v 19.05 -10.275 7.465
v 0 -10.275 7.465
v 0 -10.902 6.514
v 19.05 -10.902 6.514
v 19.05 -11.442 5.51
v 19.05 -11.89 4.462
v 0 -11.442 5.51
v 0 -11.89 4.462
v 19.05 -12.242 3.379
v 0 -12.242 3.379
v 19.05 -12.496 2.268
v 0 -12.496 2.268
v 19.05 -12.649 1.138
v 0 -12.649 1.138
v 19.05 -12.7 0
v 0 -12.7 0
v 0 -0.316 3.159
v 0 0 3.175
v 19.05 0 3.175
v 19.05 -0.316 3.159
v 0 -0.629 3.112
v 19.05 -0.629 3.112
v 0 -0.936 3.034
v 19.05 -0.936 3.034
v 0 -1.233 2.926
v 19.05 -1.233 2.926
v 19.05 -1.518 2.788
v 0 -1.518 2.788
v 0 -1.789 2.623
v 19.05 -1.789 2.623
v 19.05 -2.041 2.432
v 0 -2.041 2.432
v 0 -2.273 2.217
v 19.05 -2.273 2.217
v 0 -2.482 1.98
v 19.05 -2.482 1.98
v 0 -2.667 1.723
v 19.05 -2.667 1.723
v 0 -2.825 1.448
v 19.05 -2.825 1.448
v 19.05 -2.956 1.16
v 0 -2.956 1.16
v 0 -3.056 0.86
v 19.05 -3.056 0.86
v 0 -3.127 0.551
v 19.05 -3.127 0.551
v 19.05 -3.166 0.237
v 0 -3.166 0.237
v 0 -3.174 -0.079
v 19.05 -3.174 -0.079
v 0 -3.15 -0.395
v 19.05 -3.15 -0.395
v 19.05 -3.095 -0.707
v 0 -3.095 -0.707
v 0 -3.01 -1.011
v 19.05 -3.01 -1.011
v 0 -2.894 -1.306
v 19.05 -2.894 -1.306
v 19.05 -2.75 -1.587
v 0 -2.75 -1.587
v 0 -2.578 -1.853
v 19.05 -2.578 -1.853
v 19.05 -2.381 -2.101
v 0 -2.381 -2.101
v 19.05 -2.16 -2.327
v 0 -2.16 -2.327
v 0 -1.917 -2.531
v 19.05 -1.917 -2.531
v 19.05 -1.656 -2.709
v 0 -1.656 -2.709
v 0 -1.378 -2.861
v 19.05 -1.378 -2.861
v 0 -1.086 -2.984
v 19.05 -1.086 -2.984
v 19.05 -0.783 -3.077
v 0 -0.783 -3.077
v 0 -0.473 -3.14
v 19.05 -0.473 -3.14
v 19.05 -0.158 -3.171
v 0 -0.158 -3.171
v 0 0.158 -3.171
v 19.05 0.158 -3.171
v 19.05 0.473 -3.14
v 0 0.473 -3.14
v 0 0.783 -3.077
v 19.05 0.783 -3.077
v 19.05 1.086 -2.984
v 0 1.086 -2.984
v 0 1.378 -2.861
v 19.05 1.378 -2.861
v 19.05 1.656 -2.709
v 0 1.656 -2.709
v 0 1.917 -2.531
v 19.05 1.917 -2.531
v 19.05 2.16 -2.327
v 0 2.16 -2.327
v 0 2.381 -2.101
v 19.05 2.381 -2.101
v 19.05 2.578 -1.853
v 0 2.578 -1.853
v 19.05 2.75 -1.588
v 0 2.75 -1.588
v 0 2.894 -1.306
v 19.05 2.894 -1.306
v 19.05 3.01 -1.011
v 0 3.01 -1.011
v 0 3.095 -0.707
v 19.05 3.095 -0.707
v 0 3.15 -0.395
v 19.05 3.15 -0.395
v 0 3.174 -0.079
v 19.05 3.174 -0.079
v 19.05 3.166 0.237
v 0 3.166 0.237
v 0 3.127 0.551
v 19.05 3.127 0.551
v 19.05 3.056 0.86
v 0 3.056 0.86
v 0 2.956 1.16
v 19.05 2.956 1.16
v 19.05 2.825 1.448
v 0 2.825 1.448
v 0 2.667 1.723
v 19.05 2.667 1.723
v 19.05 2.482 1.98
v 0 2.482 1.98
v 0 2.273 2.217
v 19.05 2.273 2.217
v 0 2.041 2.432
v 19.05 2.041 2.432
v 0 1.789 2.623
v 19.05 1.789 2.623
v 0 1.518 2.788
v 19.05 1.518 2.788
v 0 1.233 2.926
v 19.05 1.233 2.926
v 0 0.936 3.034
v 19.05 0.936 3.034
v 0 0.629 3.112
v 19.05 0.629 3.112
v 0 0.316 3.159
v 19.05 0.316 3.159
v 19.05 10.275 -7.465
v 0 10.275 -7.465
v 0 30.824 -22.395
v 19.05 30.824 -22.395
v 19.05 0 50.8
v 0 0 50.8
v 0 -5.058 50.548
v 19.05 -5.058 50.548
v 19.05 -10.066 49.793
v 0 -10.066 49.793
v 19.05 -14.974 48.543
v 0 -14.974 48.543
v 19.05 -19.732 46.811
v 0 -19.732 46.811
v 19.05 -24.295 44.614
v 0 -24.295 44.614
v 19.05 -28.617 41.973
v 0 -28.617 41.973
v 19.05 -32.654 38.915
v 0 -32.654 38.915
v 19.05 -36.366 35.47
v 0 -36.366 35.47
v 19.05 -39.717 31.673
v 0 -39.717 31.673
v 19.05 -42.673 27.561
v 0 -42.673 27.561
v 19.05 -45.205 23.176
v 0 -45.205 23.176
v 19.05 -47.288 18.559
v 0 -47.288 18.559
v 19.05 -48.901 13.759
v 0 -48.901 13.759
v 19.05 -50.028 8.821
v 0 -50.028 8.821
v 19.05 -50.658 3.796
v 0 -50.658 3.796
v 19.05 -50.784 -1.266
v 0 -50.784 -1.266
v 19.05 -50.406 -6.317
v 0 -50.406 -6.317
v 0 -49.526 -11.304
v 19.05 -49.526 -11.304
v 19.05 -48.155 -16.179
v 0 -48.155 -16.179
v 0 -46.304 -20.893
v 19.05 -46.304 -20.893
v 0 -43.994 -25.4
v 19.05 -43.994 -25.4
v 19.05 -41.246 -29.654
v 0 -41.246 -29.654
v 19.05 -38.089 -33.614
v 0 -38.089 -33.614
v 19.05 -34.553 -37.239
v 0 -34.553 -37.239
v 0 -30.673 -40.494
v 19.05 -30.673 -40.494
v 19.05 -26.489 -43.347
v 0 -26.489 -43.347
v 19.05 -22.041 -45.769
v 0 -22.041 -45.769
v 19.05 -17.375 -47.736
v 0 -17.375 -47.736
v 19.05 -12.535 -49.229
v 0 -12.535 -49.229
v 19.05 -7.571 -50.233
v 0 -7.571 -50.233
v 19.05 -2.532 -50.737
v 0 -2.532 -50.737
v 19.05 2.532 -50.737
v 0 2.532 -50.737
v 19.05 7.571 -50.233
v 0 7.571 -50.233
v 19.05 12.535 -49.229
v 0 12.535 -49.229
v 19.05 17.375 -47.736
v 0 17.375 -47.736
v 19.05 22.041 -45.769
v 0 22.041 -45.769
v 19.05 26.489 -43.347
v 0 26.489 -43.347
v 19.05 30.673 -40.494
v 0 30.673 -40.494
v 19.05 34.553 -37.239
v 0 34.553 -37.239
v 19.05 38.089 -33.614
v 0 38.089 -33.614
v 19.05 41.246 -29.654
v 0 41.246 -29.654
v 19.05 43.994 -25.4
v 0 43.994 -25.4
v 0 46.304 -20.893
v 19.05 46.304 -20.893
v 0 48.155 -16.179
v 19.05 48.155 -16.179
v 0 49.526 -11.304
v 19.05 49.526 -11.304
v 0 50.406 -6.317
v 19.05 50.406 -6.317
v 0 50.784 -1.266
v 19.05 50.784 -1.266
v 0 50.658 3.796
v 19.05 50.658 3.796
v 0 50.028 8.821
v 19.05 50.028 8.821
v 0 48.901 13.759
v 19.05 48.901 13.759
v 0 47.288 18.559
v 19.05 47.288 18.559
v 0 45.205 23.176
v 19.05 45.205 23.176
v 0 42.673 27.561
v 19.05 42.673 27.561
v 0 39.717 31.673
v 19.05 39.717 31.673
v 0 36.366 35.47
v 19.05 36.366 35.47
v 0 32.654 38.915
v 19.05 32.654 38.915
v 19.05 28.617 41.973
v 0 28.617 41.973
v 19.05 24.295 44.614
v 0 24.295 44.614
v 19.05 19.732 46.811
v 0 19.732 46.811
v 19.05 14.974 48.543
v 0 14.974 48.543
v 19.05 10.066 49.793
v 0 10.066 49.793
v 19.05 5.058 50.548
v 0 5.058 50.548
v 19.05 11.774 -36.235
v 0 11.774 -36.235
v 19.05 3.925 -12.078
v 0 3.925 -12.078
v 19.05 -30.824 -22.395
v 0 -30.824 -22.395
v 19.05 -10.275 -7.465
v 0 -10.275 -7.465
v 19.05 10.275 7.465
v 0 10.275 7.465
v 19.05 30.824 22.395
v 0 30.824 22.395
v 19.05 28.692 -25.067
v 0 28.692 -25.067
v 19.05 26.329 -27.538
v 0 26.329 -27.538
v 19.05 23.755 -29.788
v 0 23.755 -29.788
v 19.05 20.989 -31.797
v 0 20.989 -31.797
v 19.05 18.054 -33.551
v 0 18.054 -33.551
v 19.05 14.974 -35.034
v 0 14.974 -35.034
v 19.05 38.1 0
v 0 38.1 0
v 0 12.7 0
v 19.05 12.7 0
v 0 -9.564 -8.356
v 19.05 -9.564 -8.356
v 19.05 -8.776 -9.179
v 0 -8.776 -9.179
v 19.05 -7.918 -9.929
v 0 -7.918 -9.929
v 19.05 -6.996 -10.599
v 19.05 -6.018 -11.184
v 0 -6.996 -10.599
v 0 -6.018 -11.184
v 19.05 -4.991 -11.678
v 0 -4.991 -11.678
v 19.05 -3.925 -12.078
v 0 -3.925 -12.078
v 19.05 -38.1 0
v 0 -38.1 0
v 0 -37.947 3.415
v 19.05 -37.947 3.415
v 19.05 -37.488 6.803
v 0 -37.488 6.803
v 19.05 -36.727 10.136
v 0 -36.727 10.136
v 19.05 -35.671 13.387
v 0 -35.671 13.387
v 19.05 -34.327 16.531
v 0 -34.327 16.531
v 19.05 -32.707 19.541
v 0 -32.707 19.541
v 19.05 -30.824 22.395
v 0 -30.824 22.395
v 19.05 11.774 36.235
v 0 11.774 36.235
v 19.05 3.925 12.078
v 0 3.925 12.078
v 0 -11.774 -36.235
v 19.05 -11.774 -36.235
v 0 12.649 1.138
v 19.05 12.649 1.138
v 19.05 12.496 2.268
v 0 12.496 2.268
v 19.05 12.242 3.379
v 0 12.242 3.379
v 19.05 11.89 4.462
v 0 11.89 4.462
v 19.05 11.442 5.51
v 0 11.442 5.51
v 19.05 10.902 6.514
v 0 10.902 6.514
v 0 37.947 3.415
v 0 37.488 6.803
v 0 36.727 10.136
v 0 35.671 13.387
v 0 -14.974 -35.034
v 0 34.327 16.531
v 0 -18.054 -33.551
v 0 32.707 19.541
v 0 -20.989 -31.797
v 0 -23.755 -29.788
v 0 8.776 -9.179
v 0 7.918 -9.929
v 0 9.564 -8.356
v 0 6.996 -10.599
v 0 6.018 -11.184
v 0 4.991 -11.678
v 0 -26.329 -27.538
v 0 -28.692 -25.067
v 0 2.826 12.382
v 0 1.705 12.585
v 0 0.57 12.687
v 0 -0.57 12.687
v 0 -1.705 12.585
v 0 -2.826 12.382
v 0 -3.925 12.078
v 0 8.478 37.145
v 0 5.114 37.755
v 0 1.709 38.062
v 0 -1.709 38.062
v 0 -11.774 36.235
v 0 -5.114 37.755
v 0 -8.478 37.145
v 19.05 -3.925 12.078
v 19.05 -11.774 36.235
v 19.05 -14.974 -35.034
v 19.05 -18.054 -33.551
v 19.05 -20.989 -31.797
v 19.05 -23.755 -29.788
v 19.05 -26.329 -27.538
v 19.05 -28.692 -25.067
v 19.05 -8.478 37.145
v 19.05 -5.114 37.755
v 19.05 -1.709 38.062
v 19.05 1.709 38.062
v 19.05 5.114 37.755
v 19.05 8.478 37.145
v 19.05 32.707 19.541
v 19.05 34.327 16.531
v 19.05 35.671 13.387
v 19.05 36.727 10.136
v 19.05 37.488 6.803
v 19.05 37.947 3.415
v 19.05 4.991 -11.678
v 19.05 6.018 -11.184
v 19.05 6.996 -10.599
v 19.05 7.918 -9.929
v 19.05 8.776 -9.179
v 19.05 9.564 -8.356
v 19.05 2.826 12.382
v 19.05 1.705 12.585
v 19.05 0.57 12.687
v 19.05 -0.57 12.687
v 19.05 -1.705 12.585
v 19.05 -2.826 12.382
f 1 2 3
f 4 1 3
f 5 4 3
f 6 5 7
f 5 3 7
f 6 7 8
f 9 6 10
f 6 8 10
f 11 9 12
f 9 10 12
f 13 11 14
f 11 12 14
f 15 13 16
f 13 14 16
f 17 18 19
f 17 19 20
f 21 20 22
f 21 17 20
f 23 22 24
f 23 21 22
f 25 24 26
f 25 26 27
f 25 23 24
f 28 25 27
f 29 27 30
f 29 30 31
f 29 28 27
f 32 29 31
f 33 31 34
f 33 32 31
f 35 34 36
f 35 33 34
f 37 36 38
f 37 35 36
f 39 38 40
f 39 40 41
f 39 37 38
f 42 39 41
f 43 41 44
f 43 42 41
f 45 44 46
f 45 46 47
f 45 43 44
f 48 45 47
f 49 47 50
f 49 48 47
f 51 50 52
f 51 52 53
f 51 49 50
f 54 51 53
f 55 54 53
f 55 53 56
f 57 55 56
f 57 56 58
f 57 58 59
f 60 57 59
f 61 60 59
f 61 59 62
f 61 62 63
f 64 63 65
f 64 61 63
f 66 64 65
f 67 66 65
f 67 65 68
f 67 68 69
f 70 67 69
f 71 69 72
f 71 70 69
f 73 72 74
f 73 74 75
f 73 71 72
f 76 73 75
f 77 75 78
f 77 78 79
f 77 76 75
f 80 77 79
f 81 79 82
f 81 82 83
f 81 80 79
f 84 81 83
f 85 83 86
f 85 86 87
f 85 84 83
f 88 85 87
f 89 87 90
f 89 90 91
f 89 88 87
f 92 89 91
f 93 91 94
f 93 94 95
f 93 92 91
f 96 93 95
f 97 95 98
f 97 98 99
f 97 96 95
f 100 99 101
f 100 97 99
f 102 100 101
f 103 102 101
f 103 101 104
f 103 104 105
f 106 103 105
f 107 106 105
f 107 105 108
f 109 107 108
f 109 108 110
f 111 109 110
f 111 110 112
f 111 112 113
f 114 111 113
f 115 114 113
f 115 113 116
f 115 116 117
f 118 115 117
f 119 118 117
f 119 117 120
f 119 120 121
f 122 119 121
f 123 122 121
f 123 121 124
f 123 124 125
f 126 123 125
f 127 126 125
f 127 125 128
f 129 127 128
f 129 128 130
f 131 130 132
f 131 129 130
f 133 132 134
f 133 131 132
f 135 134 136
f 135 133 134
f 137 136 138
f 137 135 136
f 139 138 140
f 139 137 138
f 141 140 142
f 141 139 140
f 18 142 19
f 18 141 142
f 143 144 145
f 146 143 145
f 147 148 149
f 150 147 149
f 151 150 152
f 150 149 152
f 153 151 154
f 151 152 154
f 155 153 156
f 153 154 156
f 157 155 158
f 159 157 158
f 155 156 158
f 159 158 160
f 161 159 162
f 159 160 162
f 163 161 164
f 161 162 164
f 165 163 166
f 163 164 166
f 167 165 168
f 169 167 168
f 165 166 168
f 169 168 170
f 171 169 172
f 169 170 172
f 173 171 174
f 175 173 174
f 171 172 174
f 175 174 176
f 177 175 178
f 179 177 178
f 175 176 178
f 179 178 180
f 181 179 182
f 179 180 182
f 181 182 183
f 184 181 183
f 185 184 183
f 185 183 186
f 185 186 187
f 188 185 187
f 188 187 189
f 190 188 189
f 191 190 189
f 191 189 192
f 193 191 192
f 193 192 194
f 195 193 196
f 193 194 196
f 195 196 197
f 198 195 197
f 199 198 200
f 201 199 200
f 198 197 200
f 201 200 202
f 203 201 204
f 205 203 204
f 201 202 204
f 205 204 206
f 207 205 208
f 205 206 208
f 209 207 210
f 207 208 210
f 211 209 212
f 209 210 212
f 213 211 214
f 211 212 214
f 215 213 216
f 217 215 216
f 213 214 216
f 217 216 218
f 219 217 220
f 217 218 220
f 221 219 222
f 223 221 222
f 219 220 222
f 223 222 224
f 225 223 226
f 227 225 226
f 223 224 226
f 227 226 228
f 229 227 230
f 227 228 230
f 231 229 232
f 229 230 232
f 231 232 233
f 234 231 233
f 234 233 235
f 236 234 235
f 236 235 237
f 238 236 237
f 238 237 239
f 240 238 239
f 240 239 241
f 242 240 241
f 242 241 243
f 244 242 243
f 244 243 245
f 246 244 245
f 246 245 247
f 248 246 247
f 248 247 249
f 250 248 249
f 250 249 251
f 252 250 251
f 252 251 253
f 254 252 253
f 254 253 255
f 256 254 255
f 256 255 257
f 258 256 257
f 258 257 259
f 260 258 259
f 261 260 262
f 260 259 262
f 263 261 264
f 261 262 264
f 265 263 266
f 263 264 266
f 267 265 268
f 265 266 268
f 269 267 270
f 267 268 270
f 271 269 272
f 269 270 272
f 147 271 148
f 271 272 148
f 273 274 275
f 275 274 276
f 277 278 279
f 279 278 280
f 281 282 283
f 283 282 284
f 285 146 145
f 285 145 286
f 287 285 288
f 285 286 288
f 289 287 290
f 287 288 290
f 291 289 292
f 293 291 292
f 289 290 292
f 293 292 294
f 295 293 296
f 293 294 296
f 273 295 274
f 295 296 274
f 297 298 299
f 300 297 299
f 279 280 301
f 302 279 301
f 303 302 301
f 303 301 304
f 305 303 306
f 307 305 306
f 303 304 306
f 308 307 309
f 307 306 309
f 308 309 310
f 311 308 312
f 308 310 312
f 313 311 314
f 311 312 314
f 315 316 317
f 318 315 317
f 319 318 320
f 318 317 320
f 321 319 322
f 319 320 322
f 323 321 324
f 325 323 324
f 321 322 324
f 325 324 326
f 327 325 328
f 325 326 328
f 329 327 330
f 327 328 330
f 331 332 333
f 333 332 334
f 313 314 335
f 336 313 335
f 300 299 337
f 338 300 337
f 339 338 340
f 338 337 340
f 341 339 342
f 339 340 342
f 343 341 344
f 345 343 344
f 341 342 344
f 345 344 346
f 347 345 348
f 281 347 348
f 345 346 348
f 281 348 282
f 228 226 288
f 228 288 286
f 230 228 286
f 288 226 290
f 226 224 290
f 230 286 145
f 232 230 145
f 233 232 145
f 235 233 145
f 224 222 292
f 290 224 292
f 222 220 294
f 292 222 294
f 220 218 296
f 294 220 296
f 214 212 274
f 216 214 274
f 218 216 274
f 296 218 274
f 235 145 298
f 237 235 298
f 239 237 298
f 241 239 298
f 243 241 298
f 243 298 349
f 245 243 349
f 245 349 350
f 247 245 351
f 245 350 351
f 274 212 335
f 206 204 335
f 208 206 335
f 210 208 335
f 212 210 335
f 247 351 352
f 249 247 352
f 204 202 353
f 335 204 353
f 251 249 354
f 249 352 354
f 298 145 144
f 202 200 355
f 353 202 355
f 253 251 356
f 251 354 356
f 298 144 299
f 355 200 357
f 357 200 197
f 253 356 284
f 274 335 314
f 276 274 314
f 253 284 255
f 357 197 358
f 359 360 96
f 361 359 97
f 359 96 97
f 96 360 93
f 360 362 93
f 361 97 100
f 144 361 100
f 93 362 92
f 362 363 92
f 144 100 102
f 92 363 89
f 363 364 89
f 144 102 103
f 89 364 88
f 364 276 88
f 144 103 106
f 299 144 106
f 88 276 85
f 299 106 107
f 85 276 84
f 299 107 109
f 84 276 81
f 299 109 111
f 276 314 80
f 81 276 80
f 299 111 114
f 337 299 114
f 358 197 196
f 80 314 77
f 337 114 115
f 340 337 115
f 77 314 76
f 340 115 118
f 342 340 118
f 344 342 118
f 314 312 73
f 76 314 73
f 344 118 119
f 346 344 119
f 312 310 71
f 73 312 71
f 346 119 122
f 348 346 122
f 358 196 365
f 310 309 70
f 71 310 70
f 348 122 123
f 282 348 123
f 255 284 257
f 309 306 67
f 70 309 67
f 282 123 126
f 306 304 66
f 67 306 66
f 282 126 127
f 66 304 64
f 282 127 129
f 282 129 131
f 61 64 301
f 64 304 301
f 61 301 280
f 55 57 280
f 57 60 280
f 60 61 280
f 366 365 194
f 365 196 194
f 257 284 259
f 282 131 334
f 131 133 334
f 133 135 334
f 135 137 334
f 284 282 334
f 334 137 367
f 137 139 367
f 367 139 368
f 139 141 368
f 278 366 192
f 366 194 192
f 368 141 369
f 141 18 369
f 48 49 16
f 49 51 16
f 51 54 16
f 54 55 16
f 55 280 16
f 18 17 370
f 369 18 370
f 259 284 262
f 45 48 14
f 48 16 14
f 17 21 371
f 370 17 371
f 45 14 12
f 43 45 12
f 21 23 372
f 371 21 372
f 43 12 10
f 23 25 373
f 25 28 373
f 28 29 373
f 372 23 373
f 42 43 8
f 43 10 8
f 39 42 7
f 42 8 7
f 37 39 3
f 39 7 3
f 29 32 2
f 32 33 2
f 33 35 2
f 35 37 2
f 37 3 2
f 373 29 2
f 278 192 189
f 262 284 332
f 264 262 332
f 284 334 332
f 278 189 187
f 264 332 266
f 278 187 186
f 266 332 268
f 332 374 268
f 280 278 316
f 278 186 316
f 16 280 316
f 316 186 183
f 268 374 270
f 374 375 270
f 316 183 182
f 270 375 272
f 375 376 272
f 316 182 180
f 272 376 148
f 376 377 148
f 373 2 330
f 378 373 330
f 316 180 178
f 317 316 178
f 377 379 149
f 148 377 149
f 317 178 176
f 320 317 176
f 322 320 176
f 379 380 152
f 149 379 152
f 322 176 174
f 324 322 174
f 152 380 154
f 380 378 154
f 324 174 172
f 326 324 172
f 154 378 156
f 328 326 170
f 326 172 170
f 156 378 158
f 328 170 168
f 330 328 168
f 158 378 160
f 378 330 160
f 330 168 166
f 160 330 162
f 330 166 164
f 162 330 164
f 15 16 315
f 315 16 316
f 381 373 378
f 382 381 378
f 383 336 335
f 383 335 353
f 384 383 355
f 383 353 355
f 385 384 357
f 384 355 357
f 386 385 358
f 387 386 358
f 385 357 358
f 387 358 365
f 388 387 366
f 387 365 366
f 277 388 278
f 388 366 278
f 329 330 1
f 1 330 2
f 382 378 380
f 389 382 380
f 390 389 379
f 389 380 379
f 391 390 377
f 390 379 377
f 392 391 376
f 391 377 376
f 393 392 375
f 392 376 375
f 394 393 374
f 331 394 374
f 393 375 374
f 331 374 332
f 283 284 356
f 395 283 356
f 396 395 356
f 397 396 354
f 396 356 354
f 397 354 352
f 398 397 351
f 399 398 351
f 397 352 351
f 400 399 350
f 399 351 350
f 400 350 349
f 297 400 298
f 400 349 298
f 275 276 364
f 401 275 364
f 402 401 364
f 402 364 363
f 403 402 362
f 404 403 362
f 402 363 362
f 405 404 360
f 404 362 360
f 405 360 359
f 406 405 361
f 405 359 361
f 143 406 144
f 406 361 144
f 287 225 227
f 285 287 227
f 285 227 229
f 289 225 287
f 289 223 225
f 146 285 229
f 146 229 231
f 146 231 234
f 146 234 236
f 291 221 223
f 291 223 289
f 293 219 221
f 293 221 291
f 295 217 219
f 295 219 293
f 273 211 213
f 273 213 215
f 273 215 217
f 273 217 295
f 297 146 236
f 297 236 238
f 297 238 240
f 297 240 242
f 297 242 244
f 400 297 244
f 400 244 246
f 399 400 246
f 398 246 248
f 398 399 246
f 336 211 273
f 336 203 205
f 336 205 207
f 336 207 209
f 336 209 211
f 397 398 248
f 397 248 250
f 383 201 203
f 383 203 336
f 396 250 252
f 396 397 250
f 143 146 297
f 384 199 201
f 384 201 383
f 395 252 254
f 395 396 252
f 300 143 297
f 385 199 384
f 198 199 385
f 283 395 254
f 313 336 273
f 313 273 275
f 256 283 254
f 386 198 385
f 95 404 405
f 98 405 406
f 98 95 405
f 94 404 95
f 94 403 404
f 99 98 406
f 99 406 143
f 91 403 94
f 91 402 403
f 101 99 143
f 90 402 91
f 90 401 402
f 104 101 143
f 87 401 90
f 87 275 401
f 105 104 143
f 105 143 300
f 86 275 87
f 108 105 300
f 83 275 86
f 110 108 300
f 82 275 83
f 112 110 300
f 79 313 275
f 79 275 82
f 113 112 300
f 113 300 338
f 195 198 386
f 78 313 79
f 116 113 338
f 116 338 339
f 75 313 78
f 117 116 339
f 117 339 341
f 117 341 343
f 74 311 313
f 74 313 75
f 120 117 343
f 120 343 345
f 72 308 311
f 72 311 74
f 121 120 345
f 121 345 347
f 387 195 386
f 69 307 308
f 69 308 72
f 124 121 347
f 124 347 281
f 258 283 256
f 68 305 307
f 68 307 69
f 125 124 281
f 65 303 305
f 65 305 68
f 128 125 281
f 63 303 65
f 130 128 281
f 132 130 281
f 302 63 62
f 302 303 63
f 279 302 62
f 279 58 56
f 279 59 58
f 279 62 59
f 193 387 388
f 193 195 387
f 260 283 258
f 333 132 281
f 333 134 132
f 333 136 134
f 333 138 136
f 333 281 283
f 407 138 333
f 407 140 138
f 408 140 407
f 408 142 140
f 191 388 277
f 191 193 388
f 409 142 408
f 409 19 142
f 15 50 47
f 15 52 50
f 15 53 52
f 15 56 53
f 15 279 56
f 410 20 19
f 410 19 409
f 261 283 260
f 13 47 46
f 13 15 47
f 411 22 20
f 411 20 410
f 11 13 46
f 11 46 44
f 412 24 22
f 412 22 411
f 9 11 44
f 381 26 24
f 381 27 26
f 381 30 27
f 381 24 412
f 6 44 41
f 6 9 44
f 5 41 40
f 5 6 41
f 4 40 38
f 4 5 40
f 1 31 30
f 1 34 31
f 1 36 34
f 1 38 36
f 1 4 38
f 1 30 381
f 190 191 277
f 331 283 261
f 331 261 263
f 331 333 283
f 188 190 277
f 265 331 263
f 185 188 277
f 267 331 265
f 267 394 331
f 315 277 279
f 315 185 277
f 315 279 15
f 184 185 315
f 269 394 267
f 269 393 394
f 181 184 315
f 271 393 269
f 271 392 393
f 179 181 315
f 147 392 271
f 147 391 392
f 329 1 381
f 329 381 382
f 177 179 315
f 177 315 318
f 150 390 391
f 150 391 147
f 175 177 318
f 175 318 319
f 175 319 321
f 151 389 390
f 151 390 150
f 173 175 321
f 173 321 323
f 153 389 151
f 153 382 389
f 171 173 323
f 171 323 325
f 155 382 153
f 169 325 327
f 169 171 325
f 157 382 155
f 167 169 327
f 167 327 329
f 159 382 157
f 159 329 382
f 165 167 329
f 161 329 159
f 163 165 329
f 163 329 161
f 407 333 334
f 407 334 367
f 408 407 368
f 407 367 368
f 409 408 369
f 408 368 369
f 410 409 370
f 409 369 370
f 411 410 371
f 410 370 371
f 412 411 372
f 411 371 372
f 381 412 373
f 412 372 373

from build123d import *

# Parameters (mm, degrees)
SKETCH1_R           = 50.8
SKETCH1_R_2         = 3.175
BOSS_EXTRUDE1_DEPTH = 19.05


with BuildPart() as part:
    # Sketch1 → Boss-Extrude1 (new body)
    with BuildSketch(Plane(origin=(0, 0, 0), x_dir=(0, 0, -1), z_dir=(1, 0, 0))):
        with Locations(Location((0, 0, 0), (0, 0, 180))):
            Circle(SKETCH1_R)
        with BuildLine():
            Line((0, 38.1), (0, 12.7))
            ThreePointArc((0, 12.7), (-3.924515829, 12.078417757), (-7.464872704, 10.274515829))
            Line((-7.464872704, 10.274515829), (-22.394618112, 30.823547486))
            ThreePointArc((-22.394618112, 30.823547486), (-11.773547486, 36.235253271), (0, 38.1))
        make_face(mode=Mode.SUBTRACT)
        with BuildLine():
            Line((-36.235253271, 11.773547486), (-12.078417757, 3.924515829))
            ThreePointArc((-12.078417757, 3.924515829), (-12.7, 0), (-12.078417757, -3.924515829))
            Line((-12.078417757, -3.924515829), (-36.235253271, -11.773547486))
            ThreePointArc((-36.235253271, -11.773547486), (-38.1, 0), (-36.235253271, 11.773547486))
        make_face(mode=Mode.SUBTRACT)
        with BuildLine():
            Line((-22.394618112, -30.823547486), (-7.464872704, -10.274515829))
            ThreePointArc((-7.464872704, -10.274515829), (-3.924515829, -12.078417757), (0, -12.7))
            Line((0, -12.7), (0, -38.1))
            ThreePointArc((0, -38.1), (-11.773547486, -36.235253271), (-22.394618112, -30.823547486))
        make_face(mode=Mode.SUBTRACT)
        with BuildLine():
            Line((22.394618112, -30.823547486), (7.464872704, -10.274515829))
            ThreePointArc((7.464872704, -10.274515829), (10.274515829, -7.464872704), (12.078417757, -3.924515829))
            Line((12.078417757, -3.924515829), (36.235253271, -11.773547486))
            ThreePointArc((36.235253271, -11.773547486), (30.823547486, -22.394618112), (22.394618112, -30.823547486))
        make_face(mode=Mode.SUBTRACT)
        with BuildLine():
            Line((36.235253271, 11.773547486), (12.078417757, 3.924515829))
            ThreePointArc((12.078417757, 3.924515829), (10.274515829, 7.464872704), (7.464872704, 10.274515829))
            Line((7.464872704, 10.274515829), (22.394618112, 30.823547486))
            ThreePointArc((22.394618112, 30.823547486), (30.823547486, 22.394618112), (36.235253271, 11.773547486))
        make_face(mode=Mode.SUBTRACT)
        with Locations(Location((0, 0, 0), (0, 0, 180))):
            Circle(SKETCH1_R_2, mode=Mode.SUBTRACT)
    extrude(amount=BOSS_EXTRUDE1_DEPTH)


solid = part.part
